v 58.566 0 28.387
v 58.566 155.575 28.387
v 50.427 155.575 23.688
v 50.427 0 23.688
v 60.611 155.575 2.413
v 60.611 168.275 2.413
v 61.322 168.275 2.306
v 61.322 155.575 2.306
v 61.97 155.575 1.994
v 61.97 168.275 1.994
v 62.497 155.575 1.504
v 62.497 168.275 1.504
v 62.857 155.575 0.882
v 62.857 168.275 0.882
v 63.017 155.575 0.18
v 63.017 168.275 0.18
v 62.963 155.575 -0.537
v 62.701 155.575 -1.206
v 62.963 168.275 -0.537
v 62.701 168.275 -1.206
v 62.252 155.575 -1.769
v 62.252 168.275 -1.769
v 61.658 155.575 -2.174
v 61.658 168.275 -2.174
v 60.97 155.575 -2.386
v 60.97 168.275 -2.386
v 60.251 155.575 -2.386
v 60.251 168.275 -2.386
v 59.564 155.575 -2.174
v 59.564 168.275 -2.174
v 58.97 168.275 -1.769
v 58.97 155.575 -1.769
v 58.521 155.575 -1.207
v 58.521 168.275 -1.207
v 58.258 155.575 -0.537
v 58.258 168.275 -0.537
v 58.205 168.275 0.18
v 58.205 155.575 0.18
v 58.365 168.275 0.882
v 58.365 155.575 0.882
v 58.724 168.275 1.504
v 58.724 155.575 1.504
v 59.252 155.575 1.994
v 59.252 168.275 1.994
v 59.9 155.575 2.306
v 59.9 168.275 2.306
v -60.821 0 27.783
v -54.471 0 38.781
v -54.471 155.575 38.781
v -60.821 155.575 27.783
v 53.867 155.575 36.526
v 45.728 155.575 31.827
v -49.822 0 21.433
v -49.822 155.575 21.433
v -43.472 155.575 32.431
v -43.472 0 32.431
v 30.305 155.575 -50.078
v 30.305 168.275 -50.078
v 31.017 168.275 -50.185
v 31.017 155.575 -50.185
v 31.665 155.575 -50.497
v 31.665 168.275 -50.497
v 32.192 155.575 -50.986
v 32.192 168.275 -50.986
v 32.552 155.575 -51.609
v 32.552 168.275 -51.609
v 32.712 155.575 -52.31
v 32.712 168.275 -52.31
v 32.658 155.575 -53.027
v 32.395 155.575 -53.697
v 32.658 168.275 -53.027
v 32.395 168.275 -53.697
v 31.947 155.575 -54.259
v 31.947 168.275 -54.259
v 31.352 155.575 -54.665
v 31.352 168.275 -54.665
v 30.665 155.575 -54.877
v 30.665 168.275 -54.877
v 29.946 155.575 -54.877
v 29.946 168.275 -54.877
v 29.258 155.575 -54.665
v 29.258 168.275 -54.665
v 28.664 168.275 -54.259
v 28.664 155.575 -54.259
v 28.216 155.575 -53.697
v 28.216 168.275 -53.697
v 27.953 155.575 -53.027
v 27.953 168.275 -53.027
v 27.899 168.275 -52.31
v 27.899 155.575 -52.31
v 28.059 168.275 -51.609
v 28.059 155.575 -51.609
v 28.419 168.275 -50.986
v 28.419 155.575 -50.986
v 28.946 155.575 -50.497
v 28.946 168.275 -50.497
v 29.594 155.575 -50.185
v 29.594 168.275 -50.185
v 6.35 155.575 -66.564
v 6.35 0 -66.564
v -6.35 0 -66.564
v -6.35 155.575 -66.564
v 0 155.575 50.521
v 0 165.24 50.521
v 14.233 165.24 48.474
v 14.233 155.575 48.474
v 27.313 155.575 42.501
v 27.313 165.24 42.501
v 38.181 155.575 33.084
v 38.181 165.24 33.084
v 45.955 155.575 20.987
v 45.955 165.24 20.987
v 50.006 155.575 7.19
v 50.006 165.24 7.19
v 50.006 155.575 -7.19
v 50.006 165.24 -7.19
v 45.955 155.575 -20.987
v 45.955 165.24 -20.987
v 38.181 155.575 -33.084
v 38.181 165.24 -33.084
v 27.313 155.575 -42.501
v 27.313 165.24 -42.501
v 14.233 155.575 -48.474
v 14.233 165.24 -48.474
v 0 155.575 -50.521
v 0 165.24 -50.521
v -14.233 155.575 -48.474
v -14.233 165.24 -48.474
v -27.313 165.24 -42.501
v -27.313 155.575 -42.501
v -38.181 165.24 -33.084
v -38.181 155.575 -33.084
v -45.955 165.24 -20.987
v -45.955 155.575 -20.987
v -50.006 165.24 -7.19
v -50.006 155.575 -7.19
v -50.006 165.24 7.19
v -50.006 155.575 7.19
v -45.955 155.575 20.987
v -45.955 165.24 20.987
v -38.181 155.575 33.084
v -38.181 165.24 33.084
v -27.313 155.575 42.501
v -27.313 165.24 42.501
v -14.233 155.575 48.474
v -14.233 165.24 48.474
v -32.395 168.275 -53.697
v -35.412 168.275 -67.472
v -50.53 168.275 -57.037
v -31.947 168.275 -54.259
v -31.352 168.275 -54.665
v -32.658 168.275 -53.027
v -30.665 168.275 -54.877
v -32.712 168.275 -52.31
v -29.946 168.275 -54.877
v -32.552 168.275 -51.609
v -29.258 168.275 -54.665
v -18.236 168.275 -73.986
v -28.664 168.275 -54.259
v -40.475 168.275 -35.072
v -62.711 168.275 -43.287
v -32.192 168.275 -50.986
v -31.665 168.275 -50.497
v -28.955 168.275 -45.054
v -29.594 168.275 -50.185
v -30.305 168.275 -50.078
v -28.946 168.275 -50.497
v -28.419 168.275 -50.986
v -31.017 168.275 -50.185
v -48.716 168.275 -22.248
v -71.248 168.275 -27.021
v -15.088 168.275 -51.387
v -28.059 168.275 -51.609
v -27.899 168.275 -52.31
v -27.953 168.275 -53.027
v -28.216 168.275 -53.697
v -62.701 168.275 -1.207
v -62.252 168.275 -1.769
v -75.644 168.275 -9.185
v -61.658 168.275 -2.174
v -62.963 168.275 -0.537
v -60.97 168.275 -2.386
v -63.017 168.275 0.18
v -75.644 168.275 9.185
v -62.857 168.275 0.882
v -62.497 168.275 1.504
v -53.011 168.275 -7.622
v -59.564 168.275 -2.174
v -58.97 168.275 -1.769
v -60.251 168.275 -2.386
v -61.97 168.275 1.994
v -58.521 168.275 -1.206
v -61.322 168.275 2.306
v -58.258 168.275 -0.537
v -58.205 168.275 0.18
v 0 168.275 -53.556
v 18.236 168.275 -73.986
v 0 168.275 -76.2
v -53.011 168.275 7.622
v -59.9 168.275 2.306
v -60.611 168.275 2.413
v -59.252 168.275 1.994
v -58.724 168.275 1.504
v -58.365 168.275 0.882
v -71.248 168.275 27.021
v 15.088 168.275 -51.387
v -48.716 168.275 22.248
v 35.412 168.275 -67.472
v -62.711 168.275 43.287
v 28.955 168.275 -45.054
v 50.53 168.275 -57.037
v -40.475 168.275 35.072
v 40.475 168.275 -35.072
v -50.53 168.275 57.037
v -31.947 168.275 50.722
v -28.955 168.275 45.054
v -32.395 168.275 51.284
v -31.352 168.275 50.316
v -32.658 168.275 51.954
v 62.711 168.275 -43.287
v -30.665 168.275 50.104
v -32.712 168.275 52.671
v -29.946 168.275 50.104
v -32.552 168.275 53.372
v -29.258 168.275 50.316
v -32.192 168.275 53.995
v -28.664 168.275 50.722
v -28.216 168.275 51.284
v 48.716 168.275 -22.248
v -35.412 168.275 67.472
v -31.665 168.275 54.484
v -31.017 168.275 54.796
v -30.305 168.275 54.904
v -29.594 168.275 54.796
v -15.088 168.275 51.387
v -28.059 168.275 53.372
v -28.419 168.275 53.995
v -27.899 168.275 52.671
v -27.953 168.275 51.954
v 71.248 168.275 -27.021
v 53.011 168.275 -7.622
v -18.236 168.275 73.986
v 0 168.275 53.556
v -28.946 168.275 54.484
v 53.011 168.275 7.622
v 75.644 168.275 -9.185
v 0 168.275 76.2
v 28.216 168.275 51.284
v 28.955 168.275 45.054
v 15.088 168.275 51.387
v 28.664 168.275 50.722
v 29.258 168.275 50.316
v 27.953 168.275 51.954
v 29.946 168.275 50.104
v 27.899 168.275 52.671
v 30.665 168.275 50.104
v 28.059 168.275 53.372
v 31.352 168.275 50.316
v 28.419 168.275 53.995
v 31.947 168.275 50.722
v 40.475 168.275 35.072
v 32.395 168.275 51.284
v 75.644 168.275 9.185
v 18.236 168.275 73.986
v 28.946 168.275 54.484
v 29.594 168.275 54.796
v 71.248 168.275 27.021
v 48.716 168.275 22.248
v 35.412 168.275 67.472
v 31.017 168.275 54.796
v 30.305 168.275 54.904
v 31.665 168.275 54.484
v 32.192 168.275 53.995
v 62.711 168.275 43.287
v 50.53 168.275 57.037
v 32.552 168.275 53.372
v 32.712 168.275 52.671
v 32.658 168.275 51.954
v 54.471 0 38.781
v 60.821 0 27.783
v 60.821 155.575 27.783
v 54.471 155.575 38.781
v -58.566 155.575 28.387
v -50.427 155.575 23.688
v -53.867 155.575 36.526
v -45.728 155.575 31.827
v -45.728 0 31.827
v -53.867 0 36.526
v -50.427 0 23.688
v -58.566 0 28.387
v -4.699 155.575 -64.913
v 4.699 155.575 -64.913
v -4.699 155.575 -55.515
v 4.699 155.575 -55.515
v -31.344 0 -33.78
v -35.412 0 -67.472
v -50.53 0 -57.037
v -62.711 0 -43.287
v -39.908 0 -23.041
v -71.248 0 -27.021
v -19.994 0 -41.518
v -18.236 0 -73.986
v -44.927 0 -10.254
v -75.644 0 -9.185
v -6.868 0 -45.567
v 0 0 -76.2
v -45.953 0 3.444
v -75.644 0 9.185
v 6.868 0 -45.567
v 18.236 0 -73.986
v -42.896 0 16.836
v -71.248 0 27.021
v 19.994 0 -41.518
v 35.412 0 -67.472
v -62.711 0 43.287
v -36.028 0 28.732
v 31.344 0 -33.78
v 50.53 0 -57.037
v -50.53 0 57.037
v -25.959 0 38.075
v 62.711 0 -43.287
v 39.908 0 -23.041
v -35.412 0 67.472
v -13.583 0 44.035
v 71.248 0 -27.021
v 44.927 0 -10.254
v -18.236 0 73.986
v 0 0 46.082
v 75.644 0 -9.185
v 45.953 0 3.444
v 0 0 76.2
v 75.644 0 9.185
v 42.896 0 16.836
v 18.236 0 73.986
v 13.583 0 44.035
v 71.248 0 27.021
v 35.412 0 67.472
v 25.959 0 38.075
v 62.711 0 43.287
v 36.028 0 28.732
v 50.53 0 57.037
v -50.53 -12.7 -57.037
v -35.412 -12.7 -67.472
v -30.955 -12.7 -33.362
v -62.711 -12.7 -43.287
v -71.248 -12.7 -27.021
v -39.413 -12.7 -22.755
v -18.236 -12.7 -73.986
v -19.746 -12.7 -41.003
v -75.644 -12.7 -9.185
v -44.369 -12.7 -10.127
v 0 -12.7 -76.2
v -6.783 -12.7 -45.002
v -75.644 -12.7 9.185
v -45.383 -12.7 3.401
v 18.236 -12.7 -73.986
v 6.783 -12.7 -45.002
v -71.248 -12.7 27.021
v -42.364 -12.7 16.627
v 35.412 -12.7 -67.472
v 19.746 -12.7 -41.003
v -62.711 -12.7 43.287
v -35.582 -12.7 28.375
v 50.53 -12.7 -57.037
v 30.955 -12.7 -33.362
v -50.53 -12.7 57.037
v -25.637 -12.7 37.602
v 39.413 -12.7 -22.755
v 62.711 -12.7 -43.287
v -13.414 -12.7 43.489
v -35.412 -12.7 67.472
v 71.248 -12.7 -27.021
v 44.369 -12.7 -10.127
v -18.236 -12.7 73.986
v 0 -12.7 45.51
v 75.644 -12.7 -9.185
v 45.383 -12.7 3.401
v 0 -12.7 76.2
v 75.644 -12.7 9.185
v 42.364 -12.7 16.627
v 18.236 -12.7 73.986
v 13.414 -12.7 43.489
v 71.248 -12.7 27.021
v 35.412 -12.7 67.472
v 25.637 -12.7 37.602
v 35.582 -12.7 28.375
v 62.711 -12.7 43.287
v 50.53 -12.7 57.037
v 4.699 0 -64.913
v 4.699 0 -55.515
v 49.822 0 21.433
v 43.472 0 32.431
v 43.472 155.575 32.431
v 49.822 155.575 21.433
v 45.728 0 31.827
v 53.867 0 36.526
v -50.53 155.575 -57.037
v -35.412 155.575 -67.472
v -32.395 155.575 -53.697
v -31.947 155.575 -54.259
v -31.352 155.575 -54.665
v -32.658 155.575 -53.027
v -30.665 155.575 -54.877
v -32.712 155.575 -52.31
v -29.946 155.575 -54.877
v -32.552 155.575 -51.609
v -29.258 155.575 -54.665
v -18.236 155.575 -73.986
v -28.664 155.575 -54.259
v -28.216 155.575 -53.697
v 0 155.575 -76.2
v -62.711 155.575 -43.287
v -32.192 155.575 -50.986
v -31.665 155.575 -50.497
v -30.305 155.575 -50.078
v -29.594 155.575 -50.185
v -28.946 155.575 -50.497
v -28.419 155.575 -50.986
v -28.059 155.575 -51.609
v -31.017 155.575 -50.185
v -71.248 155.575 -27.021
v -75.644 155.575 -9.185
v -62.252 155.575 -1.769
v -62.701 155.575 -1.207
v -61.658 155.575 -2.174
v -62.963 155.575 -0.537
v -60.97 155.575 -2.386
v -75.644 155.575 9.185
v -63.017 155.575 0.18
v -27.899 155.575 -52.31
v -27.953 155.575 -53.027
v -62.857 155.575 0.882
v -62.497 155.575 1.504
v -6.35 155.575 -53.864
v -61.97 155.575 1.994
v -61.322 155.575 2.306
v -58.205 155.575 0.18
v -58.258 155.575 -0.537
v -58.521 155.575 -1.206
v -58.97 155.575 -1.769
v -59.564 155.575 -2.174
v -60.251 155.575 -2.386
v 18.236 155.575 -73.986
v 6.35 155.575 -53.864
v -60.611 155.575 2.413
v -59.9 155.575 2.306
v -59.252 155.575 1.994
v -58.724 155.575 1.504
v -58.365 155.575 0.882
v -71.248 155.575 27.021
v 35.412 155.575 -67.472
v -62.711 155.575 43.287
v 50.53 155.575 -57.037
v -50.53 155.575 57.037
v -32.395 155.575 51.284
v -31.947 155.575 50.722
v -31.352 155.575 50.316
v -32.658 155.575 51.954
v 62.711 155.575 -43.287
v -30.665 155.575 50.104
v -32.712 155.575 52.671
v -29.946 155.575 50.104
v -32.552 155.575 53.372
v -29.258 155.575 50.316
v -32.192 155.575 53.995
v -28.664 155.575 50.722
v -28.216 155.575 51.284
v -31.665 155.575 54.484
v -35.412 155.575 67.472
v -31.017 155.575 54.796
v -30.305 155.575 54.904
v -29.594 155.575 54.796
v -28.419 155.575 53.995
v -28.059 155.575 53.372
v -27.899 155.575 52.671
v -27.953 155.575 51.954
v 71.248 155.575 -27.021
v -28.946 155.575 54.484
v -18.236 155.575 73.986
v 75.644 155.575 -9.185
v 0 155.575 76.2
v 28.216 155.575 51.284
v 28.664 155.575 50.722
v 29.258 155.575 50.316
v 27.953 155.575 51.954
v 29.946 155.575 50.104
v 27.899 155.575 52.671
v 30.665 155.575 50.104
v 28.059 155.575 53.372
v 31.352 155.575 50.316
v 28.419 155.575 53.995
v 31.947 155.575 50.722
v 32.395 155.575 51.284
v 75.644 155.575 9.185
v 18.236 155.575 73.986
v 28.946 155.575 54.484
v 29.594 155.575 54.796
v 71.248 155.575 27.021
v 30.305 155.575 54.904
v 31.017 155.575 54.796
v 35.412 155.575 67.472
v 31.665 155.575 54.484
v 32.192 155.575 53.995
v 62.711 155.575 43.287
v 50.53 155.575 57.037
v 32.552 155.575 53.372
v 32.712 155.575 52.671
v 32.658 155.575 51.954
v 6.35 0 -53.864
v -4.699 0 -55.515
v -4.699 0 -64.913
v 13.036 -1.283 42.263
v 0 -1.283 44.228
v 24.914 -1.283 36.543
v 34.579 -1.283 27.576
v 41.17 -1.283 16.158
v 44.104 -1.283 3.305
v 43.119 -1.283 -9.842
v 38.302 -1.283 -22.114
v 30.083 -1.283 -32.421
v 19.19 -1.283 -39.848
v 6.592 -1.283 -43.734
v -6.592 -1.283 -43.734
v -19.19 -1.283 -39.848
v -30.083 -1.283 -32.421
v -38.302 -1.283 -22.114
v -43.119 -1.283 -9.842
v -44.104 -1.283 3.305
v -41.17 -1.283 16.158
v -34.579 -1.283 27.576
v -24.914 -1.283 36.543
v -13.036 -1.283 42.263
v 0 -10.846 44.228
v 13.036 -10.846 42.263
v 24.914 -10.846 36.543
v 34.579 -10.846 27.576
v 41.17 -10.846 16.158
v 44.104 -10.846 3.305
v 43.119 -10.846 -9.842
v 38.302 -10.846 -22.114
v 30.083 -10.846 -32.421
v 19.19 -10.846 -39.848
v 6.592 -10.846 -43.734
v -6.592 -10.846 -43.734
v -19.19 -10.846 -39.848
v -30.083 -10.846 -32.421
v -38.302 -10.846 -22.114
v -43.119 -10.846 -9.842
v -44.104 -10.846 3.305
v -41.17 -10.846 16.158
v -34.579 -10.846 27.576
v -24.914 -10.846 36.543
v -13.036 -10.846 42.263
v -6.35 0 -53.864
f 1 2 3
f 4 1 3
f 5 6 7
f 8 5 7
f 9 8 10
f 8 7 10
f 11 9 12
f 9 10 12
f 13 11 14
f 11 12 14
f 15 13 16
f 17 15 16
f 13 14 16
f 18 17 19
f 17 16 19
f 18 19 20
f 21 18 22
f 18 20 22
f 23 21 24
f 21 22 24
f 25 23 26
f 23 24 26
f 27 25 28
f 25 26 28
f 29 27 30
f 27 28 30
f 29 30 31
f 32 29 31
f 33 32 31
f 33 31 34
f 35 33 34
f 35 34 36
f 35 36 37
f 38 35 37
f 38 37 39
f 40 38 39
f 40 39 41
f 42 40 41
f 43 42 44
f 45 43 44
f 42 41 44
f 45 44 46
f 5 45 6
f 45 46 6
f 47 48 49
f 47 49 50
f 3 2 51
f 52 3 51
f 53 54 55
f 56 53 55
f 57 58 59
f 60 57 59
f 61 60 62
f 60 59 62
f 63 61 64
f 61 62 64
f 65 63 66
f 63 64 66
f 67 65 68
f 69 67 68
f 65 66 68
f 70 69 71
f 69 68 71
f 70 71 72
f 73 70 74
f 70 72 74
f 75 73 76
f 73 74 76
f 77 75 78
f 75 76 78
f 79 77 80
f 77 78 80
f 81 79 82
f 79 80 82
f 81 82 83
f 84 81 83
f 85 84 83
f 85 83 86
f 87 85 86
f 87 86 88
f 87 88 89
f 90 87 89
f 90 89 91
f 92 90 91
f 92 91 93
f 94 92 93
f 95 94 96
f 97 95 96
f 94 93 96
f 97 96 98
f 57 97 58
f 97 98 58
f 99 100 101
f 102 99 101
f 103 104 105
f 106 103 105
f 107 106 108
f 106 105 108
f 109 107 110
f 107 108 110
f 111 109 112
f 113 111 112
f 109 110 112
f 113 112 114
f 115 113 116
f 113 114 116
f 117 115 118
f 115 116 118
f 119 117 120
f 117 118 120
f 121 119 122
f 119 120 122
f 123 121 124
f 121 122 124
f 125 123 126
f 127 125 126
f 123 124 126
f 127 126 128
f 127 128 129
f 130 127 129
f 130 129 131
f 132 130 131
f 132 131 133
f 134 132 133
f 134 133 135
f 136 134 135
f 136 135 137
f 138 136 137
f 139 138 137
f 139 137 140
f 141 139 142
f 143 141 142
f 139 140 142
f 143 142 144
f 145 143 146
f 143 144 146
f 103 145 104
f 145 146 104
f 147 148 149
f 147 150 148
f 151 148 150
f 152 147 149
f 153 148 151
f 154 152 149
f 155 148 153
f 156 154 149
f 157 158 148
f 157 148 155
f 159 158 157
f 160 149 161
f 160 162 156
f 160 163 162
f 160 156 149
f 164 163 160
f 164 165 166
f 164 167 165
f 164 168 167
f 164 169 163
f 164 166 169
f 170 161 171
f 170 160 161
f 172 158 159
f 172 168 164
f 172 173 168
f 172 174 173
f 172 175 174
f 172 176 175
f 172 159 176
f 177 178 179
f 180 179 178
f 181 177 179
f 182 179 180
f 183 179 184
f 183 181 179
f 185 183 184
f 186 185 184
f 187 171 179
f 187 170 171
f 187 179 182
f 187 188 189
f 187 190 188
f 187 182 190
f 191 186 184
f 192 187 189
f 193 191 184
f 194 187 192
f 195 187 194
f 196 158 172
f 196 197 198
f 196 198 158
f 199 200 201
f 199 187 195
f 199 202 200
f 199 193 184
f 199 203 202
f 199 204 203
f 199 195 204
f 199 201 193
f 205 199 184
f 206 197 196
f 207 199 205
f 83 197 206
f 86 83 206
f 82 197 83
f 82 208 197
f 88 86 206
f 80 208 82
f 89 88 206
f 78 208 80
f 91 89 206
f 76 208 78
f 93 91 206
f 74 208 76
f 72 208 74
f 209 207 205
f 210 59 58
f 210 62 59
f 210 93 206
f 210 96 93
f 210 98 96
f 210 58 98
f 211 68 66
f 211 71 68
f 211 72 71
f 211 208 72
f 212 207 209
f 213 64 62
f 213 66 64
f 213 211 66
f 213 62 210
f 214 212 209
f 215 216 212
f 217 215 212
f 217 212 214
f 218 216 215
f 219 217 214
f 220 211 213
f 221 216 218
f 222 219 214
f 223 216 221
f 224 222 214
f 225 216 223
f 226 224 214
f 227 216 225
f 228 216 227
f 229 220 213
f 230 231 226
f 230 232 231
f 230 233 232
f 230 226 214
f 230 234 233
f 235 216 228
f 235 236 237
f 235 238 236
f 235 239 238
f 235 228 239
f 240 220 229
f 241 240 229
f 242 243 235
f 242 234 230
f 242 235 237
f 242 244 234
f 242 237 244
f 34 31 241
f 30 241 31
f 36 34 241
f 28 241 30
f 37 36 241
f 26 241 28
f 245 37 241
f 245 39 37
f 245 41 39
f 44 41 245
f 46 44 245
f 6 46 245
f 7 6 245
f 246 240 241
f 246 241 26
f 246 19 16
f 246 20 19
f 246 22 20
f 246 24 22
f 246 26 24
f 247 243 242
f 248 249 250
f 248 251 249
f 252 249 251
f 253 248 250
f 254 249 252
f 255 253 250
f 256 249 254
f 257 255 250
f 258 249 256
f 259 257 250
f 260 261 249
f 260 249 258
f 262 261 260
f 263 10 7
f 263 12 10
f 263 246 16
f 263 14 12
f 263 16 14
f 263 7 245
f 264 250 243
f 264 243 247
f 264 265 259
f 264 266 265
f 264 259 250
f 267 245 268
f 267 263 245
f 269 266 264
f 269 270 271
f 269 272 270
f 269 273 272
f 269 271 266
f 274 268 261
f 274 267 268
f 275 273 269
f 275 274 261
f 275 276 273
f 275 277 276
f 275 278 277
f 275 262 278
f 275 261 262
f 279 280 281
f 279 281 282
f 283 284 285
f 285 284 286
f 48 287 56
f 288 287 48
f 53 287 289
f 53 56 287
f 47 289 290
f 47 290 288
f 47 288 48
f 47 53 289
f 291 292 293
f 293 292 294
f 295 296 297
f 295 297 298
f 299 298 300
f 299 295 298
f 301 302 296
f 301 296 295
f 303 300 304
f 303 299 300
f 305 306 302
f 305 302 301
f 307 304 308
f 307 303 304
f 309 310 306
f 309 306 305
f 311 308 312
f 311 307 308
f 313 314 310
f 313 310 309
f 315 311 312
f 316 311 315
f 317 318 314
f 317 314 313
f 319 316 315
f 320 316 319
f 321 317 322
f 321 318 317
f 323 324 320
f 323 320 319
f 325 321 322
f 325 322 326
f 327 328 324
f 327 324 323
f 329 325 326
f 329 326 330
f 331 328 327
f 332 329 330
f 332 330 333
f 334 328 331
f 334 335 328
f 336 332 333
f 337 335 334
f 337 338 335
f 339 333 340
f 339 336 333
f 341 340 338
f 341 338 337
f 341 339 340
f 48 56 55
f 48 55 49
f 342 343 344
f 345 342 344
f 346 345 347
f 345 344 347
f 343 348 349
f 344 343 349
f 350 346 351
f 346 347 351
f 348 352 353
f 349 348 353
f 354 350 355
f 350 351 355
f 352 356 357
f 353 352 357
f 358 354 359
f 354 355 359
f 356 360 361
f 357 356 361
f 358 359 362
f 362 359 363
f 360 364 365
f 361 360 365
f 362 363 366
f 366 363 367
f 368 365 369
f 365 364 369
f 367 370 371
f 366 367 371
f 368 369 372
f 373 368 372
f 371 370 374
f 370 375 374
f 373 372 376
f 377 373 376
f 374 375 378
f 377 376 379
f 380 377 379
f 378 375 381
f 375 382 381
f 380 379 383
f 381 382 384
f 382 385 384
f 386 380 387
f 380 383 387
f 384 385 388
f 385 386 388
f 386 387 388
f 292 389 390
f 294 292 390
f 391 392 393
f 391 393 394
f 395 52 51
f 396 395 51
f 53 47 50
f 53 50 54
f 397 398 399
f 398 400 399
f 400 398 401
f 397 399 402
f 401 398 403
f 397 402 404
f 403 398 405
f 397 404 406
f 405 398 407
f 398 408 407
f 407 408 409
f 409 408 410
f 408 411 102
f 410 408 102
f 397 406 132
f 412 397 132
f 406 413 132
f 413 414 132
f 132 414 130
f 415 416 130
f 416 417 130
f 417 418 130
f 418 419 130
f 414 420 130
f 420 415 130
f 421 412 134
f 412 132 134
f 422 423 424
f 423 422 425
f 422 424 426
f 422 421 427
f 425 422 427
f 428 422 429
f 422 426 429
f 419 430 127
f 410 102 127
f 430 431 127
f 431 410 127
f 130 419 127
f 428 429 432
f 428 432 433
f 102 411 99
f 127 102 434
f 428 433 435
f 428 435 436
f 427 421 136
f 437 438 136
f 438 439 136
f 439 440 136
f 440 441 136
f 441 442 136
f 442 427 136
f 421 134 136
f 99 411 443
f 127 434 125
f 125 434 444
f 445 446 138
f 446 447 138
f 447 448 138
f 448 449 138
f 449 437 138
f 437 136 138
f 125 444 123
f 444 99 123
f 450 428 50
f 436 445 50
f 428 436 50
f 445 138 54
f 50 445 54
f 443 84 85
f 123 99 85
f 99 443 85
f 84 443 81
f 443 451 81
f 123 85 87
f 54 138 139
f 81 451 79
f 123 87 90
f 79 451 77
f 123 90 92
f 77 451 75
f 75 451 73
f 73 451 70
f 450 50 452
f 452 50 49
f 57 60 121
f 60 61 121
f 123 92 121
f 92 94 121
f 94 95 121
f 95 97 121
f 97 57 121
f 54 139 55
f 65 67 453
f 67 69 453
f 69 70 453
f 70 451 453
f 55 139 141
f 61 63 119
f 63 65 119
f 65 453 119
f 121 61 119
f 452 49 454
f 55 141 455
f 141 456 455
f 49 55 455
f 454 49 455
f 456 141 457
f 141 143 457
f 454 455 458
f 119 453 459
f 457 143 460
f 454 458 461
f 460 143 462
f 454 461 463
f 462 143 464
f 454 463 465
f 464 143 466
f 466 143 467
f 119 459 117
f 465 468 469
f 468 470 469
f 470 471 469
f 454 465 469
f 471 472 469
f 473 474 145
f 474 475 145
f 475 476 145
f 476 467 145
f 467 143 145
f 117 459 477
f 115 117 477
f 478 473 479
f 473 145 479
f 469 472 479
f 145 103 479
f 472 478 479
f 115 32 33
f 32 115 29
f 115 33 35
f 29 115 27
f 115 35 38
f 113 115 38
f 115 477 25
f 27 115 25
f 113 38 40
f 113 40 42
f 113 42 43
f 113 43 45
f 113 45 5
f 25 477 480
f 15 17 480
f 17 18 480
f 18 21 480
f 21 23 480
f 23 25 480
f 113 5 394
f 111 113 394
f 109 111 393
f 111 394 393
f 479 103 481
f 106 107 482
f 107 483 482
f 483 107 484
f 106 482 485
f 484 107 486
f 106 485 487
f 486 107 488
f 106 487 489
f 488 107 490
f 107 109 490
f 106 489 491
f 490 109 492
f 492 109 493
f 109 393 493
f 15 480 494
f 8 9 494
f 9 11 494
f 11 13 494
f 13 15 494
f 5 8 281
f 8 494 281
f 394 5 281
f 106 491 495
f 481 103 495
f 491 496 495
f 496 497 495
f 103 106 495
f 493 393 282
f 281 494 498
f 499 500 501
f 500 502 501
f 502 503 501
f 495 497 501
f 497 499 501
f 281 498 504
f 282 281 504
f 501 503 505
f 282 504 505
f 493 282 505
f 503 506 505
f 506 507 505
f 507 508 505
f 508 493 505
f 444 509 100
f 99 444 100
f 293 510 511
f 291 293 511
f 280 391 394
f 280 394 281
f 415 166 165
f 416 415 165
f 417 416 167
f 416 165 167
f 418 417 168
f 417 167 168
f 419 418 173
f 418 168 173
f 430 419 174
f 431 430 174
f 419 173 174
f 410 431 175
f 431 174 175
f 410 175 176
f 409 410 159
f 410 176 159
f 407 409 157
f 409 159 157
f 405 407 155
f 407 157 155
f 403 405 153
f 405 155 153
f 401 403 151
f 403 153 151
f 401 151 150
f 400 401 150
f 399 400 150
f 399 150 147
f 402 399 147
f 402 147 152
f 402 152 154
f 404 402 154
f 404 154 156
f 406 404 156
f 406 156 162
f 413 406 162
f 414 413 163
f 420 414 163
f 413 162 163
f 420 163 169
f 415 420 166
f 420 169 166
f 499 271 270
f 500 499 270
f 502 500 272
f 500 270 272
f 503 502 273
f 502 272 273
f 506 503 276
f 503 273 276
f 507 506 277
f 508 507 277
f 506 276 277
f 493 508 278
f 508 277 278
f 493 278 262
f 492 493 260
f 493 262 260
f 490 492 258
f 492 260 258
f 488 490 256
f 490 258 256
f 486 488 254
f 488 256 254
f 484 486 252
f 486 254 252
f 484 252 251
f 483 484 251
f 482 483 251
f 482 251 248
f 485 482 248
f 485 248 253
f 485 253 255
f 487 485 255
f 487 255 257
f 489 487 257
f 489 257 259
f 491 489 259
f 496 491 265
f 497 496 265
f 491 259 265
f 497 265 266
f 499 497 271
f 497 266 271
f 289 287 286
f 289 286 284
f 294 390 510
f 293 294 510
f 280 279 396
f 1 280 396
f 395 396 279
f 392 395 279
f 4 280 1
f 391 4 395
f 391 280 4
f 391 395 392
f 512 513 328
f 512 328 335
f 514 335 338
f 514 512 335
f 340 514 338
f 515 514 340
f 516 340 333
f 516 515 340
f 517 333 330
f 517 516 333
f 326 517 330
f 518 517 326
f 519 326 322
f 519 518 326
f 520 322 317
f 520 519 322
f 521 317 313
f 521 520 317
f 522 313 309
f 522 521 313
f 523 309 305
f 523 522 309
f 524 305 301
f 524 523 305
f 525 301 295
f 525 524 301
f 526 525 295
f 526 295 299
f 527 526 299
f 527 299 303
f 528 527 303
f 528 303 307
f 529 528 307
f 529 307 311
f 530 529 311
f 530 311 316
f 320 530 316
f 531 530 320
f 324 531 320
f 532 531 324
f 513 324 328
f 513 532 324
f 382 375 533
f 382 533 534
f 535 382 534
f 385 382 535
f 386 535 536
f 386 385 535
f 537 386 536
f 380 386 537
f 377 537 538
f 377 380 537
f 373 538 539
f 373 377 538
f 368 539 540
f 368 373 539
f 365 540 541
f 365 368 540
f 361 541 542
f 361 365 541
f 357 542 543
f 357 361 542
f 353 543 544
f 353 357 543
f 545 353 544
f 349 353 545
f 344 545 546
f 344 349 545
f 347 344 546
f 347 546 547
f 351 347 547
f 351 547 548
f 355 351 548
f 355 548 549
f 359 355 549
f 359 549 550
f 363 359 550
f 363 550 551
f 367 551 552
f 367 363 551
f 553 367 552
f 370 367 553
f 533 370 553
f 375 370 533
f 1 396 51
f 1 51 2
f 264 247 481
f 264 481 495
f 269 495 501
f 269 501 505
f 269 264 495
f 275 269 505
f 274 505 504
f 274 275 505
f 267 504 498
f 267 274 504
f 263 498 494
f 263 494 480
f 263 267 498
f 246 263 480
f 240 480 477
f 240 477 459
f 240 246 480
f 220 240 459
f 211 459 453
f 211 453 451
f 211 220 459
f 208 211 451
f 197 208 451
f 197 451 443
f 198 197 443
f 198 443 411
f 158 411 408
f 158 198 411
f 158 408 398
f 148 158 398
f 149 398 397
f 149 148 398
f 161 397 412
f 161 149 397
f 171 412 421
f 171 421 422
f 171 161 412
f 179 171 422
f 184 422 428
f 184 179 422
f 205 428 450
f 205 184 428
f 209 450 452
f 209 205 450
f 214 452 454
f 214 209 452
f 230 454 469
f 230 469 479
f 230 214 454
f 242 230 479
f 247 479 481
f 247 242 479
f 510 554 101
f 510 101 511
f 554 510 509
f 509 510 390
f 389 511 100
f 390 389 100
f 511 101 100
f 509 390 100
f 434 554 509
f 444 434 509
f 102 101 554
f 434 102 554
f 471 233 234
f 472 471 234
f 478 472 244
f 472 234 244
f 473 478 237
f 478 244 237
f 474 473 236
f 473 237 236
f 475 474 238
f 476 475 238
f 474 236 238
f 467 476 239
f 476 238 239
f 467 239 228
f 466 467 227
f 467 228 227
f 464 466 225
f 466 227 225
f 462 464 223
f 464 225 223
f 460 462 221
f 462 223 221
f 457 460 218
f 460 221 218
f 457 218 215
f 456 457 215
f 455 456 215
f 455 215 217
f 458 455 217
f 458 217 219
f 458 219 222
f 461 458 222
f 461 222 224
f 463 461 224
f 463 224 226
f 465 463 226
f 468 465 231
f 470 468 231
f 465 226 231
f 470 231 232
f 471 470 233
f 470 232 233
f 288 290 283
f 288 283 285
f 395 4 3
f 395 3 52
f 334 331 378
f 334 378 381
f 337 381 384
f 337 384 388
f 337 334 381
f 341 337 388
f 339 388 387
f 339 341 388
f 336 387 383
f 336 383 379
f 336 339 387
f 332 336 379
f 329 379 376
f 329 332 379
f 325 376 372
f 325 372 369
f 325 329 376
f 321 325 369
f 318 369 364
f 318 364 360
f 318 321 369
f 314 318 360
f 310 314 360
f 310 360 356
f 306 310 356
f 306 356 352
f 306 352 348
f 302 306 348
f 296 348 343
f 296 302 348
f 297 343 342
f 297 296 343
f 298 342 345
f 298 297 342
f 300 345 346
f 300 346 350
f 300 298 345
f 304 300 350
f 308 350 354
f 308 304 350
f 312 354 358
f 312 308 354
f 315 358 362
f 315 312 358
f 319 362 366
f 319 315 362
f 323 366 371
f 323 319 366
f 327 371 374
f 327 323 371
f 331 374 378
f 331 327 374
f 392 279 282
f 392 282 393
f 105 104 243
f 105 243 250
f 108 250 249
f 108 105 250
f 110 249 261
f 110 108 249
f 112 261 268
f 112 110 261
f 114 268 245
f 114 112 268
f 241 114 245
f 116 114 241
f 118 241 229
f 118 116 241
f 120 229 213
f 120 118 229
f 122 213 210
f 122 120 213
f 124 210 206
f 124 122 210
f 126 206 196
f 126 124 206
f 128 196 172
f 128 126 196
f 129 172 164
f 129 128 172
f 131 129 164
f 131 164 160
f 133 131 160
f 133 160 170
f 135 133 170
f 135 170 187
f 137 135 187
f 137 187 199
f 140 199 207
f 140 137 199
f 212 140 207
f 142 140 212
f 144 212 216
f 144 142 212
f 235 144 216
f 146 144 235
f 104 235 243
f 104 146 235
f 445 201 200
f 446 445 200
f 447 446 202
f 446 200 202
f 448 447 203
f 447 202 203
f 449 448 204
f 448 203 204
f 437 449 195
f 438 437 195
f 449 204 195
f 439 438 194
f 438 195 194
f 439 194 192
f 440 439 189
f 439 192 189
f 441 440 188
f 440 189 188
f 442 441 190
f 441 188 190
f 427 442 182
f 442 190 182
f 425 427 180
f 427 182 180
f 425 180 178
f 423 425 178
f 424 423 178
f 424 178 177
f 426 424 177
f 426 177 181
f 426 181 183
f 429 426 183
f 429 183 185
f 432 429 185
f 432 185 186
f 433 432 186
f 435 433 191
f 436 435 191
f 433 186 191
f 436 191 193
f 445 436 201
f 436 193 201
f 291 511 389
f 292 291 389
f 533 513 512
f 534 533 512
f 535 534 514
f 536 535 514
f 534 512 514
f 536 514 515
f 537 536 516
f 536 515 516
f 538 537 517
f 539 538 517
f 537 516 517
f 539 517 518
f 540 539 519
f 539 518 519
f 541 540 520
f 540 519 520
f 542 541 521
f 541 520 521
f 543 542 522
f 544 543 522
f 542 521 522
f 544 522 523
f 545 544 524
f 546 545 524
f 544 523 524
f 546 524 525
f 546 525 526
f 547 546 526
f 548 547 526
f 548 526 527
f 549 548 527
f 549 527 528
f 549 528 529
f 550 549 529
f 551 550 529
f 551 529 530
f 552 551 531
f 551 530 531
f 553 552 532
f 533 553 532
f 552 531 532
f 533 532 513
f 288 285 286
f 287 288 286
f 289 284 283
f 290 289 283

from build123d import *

# Parameters (mm, degrees)
SKETCH1_R             = 76.2
SKETCH1_R_2           = 44.22775
BOSS_EXTRUDE1_DEPTH   = 12.7
SKETCH1_5_W           = 12.7
SKETCH1_5_H           = 12.7
SKETCH1_5_W_2         = 9.398
SKETCH1_5_H_2         = 9.398
BOSS_EXTRUDE2_DEPTH   = 155.575
BOSS_EXTRUDE2_2_DEPTH = 155.575
BOSS_EXTRUDE2_3_DEPTH = 155.575
BOSS_EXTRUDE3_START   = 12.7
SKETCH2_R             = 76.2
SKETCH2_R_2           = 2.413
SKETCH2_R_3           = 50.5206
BOSS_EXTRUDE3_DEPTH   = 12.7
CHAMFER1_SIZE         = 3.0353
CHAMFER2_SIZE         = 1.8542
CHAMFER2_SIZE2        = 1.2827
CHAMFER3_SIZE         = 1.8542
CHAMFER3_SIZE2        = 1.2827


with BuildPart() as part:
    # Sketch1 → Boss-Extrude1 (new body)
    with BuildSketch(Plane(origin=(0, 0, 0), x_dir=(1, 0, 0), z_dir=(0, 1, 0))):
        Circle(SKETCH1_R)
        Circle(SKETCH1_R_2, mode=Mode.SUBTRACT)
    extrude(amount=-BOSS_EXTRUDE1_DEPTH)

    # Chamfer2
    chamfer2_edges = [part.edges().sort_by_distance(p)[0] for p in [
        (-44.22775, 0, 0),
    ]]
    chamfer2_side = [part.faces().sort_by_distance(p)[0] for p in [
        (-74.044738531, 0, 0),
    ]]
    chamfer(chamfer2_edges, length=CHAMFER2_SIZE, length2=CHAMFER2_SIZE2, reference=chamfer2_side[0])

    # Chamfer3
    chamfer3_edges = [part.edges().sort_by_distance(p)[0] for p in [
        (-44.22775, -12.7, 0),
    ]]
    chamfer3_side = [part.faces().sort_by_distance(p)[0] for p in [
        (-44.22775, -6.99135, 0),
    ]]
    chamfer(chamfer3_edges, length=CHAMFER3_SIZE, length2=CHAMFER3_SIZE2, reference=chamfer3_side[0])


with BuildPart() as body_2:
    # Sketch1<5> → Boss-Extrude2 (new body)
    with BuildSketch(Plane(origin=(0, 0, 0), x_dir=(1, 0, 0), z_dir=(0, 1, 0))):
        with Locations((0, 60.213875)):
            Rectangle(SKETCH1_5_W, SKETCH1_5_H)
        with Locations((0, 60.213875)):
            Rectangle(SKETCH1_5_W_2, SKETCH1_5_H_2, mode=Mode.SUBTRACT)
    extrude(amount=BOSS_EXTRUDE2_DEPTH)



with BuildPart() as body_3:
    # Sketch1<5> → Boss-Extrude2 2 (new body)
    with BuildSketch(Plane(origin=(0, 0, 0), x_dir=(1, 0, 0), z_dir=(0, 1, 0))):
        Polygon((60.821006724, -27.782676186), (49.822484096, -21.432676186), (43.472484096, -32.431198814), (54.471006724, -38.781198814), align=None)
        Polygon((45.727792038, -31.826890872), (50.426792038, -23.687984128), (58.565698783, -28.386984128), (53.866698783, -36.525890872), align=None, mode=Mode.SUBTRACT)
    extrude(amount=BOSS_EXTRUDE2_2_DEPTH)


with BuildPart() as body_4:
    # Sketch1<5> → Boss-Extrude2 3 (new body)
    with BuildSketch(Plane(origin=(0, 0, 0), x_dir=(1, 0, 0), z_dir=(0, 1, 0))):
        Polygon((-54.471006724, -38.781198814), (-43.472484096, -32.431198814), (-49.822484096, -21.432676186), (-60.821006724, -27.782676186), align=None)
        Polygon((-50.426792038, -23.687984128), (-45.727792038, -31.826890872), (-53.866698783, -36.525890872), (-58.565698783, -28.386984128), align=None, mode=Mode.SUBTRACT)
    extrude(amount=BOSS_EXTRUDE2_3_DEPTH)


with BuildPart() as body_2_1:
    add(body_2.part)

    add(body_3.part)  # Boss-Extrude3 merges body 3

    add(body_4.part)  # Boss-Extrude3 merges body 4
    # Sketch2 → Boss-Extrude3 (add)
    with BuildSketch(Plane(origin=(0, 155.575, 0), x_dir=(1, 0, 0), z_dir=(0, 1, 0)).offset(BOSS_EXTRUDE3_START)):
        Circle(SKETCH2_R)
        with Locations((30.3054258, -52.490537231)):
            Circle(SKETCH2_R_2, mode=Mode.SUBTRACT)
        with Locations((-30.3054258, 52.490537231)):
            Circle(SKETCH2_R_2, mode=Mode.SUBTRACT)
        with Locations((-60.6108516, 0)):
            Circle(SKETCH2_R_2, mode=Mode.SUBTRACT)
        with Locations((-30.3054258, -52.490537231)):
            Circle(SKETCH2_R_2, mode=Mode.SUBTRACT)
        with Locations((60.6108516, 0)):
            Circle(SKETCH2_R_2, mode=Mode.SUBTRACT)
        with Locations((30.3054258, 52.490537231)):
            Circle(SKETCH2_R_2, mode=Mode.SUBTRACT)
        Circle(SKETCH2_R_3, mode=Mode.SUBTRACT)
    extrude(amount=-BOSS_EXTRUDE3_DEPTH)

    # Chamfer1
    chamfer1_edges = [body_2_1.edges().sort_by_distance(p)[0] for p in [
        (-50.5206, 168.275, 0),
    ]]
    chamfer(chamfer1_edges, length=CHAMFER1_SIZE)


solid = Compound([part.part, body_2_1.part])
